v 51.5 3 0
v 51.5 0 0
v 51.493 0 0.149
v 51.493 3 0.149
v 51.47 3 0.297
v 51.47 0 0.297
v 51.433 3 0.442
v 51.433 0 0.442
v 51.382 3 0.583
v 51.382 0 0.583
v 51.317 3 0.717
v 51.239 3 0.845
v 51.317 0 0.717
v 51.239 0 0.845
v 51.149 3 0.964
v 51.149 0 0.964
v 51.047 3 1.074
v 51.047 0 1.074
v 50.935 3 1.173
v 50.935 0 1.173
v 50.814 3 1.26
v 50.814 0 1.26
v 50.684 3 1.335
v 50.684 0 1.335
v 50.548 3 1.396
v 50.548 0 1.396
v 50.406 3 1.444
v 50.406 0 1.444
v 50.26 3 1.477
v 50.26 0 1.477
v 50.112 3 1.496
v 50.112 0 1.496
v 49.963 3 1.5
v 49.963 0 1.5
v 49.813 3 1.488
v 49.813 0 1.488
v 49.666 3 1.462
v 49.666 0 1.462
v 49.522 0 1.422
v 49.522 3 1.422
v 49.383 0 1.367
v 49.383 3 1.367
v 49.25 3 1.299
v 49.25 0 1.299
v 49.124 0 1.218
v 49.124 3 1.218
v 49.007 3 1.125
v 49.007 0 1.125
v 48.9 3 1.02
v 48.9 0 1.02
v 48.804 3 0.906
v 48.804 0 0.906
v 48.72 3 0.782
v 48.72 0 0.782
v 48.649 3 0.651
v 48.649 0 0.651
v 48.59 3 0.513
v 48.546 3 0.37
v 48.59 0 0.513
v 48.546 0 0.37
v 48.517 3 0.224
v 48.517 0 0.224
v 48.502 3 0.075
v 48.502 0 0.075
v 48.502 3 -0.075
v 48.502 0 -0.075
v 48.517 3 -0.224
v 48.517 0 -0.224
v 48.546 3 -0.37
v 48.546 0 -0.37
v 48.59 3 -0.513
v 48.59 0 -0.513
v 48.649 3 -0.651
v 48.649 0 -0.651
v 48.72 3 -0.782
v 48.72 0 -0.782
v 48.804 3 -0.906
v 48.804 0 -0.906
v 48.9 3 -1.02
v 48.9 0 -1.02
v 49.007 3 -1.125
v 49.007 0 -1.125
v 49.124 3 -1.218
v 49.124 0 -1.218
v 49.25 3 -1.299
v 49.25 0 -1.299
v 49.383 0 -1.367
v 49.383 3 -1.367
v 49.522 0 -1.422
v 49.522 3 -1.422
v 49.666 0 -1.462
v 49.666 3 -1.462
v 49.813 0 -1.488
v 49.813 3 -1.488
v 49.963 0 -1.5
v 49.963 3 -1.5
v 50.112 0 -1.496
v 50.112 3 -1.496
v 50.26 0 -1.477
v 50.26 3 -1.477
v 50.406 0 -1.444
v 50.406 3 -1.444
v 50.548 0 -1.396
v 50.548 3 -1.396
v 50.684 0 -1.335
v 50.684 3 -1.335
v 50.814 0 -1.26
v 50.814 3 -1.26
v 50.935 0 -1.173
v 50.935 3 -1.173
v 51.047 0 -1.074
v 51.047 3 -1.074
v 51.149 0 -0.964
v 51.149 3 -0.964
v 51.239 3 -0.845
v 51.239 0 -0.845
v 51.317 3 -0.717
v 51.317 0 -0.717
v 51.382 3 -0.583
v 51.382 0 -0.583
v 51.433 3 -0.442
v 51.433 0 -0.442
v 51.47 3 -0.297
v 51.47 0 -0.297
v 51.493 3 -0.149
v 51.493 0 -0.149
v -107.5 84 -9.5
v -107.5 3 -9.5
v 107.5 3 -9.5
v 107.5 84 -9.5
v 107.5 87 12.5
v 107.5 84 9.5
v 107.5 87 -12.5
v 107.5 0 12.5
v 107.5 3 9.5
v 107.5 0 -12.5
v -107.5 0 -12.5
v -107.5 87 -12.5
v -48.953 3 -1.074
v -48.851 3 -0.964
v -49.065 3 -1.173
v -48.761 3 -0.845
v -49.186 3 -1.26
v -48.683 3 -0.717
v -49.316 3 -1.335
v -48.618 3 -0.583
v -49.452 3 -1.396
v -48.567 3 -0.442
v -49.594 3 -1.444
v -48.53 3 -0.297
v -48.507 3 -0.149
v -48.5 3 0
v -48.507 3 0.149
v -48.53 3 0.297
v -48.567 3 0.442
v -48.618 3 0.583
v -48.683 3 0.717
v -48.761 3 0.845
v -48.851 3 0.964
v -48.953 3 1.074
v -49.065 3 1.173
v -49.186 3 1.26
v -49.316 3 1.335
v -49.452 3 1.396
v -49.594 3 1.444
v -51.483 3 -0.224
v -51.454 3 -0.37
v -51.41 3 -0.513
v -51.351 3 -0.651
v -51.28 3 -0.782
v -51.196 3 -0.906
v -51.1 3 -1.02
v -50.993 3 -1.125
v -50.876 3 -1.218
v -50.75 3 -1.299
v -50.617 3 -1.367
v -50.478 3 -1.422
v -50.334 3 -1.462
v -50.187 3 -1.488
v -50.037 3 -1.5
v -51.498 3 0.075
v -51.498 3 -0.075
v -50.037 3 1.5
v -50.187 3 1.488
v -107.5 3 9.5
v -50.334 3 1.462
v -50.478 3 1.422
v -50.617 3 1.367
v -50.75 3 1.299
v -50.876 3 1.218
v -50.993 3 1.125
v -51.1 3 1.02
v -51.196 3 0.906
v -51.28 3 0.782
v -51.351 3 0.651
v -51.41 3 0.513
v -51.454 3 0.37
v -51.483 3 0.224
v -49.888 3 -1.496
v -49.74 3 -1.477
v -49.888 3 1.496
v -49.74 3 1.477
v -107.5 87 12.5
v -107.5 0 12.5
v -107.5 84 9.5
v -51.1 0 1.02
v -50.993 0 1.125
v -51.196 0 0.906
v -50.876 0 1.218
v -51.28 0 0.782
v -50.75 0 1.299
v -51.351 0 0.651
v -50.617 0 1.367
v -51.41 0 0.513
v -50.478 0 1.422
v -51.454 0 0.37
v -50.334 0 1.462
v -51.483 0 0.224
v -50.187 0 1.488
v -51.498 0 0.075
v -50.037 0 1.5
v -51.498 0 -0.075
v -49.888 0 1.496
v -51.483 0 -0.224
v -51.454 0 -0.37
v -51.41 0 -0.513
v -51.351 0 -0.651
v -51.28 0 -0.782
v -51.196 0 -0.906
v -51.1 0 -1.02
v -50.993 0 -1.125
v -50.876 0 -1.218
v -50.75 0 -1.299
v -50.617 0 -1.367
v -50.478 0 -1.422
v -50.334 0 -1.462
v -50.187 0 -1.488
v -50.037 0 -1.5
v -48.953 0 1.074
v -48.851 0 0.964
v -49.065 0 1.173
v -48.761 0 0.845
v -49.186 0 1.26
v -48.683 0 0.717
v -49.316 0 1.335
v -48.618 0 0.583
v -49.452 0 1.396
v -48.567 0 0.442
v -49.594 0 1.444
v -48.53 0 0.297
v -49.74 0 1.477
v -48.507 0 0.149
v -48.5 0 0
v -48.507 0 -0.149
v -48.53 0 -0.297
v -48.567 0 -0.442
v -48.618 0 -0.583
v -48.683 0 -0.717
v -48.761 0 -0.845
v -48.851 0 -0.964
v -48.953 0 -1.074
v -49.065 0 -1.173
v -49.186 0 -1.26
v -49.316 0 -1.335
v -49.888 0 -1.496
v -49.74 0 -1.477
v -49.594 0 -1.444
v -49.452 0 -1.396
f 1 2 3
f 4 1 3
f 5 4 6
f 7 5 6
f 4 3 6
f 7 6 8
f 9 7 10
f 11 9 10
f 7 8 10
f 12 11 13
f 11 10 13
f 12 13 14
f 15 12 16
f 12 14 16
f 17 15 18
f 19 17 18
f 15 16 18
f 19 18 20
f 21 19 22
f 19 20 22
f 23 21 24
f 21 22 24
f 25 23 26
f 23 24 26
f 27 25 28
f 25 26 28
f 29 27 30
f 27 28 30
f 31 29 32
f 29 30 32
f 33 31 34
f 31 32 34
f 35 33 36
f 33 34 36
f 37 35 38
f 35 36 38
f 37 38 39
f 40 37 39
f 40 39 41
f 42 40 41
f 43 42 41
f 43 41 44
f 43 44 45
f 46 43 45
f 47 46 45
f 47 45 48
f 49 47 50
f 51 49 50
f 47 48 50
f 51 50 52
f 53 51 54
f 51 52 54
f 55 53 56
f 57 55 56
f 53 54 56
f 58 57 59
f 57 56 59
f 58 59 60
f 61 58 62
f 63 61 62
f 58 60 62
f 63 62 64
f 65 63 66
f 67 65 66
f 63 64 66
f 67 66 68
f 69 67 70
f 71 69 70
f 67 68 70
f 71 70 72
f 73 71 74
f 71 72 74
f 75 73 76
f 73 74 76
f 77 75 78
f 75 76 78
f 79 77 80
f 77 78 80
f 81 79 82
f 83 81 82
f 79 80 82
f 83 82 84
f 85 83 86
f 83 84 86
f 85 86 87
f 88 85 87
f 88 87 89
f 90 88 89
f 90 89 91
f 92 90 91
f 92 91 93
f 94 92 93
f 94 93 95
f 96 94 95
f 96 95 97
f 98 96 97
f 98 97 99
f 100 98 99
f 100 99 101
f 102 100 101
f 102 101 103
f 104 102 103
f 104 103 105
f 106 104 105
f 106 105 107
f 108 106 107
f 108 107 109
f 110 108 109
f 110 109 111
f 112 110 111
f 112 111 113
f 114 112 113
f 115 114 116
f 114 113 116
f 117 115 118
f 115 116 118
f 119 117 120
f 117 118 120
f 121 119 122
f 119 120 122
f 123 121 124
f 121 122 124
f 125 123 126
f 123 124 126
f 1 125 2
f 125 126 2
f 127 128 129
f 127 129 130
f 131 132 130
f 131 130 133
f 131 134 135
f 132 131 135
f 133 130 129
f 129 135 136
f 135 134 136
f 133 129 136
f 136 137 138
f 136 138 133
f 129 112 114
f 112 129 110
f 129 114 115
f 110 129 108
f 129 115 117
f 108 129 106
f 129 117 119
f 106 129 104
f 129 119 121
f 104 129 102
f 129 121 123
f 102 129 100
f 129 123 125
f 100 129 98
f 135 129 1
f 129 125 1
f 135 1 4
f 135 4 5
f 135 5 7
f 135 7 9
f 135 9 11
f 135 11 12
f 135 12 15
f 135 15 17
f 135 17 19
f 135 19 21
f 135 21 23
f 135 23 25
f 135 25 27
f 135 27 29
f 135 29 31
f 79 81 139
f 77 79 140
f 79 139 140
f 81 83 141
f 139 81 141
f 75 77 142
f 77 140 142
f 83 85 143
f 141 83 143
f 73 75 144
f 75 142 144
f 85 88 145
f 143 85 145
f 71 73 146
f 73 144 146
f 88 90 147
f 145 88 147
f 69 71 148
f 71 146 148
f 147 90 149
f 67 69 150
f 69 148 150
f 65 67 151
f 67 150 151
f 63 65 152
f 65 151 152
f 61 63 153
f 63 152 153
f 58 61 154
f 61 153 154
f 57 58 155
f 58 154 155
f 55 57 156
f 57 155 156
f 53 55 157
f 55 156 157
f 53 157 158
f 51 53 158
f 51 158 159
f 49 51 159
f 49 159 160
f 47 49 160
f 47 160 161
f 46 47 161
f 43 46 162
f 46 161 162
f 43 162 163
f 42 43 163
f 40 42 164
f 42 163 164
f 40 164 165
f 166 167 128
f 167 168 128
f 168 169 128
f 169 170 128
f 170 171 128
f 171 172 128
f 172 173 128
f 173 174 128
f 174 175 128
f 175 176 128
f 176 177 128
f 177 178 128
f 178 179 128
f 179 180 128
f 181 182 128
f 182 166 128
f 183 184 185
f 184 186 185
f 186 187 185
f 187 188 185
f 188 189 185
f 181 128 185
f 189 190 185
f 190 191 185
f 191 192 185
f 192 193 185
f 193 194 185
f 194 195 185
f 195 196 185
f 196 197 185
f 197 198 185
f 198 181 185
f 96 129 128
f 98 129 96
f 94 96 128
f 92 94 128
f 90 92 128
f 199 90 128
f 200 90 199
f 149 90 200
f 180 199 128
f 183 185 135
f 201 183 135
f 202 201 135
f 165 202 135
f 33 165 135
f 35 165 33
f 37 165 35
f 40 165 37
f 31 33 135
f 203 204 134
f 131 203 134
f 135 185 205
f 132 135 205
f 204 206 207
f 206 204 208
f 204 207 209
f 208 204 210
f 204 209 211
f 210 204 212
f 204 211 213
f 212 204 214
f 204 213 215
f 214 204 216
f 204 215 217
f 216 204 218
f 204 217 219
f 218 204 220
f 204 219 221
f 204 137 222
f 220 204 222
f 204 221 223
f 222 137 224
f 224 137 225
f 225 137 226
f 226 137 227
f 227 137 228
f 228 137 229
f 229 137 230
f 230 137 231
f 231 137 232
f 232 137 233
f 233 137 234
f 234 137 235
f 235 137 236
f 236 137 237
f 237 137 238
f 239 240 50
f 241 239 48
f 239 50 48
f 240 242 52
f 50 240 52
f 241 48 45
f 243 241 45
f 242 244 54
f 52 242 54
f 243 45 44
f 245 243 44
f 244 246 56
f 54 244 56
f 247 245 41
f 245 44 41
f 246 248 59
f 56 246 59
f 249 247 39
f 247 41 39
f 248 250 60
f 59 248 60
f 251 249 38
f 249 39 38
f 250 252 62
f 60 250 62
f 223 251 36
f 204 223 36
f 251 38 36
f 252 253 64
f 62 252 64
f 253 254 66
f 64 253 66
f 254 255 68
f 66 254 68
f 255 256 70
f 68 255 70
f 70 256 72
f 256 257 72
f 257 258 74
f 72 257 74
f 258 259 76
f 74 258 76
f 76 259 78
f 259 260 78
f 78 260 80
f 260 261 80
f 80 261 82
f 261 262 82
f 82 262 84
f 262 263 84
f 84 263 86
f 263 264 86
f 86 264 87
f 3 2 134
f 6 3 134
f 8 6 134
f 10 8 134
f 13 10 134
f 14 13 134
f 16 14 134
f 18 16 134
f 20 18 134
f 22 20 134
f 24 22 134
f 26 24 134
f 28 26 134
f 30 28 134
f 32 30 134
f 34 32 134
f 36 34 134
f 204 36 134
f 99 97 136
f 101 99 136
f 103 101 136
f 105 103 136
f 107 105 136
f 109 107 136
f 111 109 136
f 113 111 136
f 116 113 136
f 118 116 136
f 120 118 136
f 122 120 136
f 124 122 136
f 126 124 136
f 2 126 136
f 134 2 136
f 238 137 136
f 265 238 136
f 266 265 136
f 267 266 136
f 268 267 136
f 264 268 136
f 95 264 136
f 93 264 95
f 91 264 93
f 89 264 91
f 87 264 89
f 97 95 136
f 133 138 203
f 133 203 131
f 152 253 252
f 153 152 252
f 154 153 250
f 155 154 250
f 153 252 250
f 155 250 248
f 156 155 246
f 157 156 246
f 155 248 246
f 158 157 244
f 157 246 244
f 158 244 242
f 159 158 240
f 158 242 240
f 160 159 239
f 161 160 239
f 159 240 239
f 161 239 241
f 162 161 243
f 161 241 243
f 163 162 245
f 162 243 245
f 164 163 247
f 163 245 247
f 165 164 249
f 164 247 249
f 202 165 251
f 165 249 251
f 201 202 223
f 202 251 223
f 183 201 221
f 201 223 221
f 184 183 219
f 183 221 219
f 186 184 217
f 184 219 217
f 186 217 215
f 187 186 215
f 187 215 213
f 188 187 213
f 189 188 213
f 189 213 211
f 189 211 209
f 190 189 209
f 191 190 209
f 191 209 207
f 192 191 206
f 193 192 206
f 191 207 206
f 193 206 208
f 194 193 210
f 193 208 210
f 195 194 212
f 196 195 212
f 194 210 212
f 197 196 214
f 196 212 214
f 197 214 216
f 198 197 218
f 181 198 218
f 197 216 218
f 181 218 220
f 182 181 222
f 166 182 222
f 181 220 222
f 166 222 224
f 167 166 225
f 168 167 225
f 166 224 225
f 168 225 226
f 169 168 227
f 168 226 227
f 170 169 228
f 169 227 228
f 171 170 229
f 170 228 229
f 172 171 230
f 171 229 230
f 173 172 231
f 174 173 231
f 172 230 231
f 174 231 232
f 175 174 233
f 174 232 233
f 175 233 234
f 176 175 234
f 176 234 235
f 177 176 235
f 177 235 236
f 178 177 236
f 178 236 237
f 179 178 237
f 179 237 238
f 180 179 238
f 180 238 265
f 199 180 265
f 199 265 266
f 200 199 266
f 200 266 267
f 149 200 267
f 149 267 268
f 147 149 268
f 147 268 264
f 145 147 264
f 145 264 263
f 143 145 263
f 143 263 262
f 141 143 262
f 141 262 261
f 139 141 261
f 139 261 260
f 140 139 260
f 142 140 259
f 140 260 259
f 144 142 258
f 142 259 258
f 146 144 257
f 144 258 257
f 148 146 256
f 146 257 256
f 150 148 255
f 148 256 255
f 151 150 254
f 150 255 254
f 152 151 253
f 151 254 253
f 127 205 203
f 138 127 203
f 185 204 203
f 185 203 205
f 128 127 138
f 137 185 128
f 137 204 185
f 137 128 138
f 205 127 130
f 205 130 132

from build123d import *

# Parameters (mm, degrees)
SKETCH1_W           = 215
SKETCH1_H           = 25
BOSS_EXTRUDE1_DEPTH = 87
SKETCH3_W           = 19
SKETCH3_H           = 81
CUT_EXTRUDE1_DEPTH  = 216
SKETCH4_R           = 1.5
CUT_EXTRUDE2_DEPTH  = 3


with BuildPart() as part:
    # Sketch1 → Boss-Extrude1 (new body)
    with BuildSketch(Plane(origin=(0, 0, 0), x_dir=(1, 0, 0), z_dir=(0, 1, 0))):
        Rectangle(SKETCH1_W, SKETCH1_H)
    extrude(amount=BOSS_EXTRUDE1_DEPTH)

    # Sketch3 → Cut-Extrude1 (cut, through all)
    with BuildSketch(Plane.ZY.offset(107.5)):
        with Locations((0, 43.5)):
            Rectangle(SKETCH3_W, SKETCH3_H)
    extrude(amount=-CUT_EXTRUDE1_DEPTH, mode=Mode.SUBTRACT)

    # Sketch4 → Cut-Extrude2 (cut)
    with BuildSketch(Plane.XZ):
        with Locations((-50, 0)):
            Circle(SKETCH4_R)
        with Locations((50, 0)):
            Circle(SKETCH4_R)
    extrude(amount=-CUT_EXTRUDE2_DEPTH, mode=Mode.SUBTRACT)


solid = part.part
